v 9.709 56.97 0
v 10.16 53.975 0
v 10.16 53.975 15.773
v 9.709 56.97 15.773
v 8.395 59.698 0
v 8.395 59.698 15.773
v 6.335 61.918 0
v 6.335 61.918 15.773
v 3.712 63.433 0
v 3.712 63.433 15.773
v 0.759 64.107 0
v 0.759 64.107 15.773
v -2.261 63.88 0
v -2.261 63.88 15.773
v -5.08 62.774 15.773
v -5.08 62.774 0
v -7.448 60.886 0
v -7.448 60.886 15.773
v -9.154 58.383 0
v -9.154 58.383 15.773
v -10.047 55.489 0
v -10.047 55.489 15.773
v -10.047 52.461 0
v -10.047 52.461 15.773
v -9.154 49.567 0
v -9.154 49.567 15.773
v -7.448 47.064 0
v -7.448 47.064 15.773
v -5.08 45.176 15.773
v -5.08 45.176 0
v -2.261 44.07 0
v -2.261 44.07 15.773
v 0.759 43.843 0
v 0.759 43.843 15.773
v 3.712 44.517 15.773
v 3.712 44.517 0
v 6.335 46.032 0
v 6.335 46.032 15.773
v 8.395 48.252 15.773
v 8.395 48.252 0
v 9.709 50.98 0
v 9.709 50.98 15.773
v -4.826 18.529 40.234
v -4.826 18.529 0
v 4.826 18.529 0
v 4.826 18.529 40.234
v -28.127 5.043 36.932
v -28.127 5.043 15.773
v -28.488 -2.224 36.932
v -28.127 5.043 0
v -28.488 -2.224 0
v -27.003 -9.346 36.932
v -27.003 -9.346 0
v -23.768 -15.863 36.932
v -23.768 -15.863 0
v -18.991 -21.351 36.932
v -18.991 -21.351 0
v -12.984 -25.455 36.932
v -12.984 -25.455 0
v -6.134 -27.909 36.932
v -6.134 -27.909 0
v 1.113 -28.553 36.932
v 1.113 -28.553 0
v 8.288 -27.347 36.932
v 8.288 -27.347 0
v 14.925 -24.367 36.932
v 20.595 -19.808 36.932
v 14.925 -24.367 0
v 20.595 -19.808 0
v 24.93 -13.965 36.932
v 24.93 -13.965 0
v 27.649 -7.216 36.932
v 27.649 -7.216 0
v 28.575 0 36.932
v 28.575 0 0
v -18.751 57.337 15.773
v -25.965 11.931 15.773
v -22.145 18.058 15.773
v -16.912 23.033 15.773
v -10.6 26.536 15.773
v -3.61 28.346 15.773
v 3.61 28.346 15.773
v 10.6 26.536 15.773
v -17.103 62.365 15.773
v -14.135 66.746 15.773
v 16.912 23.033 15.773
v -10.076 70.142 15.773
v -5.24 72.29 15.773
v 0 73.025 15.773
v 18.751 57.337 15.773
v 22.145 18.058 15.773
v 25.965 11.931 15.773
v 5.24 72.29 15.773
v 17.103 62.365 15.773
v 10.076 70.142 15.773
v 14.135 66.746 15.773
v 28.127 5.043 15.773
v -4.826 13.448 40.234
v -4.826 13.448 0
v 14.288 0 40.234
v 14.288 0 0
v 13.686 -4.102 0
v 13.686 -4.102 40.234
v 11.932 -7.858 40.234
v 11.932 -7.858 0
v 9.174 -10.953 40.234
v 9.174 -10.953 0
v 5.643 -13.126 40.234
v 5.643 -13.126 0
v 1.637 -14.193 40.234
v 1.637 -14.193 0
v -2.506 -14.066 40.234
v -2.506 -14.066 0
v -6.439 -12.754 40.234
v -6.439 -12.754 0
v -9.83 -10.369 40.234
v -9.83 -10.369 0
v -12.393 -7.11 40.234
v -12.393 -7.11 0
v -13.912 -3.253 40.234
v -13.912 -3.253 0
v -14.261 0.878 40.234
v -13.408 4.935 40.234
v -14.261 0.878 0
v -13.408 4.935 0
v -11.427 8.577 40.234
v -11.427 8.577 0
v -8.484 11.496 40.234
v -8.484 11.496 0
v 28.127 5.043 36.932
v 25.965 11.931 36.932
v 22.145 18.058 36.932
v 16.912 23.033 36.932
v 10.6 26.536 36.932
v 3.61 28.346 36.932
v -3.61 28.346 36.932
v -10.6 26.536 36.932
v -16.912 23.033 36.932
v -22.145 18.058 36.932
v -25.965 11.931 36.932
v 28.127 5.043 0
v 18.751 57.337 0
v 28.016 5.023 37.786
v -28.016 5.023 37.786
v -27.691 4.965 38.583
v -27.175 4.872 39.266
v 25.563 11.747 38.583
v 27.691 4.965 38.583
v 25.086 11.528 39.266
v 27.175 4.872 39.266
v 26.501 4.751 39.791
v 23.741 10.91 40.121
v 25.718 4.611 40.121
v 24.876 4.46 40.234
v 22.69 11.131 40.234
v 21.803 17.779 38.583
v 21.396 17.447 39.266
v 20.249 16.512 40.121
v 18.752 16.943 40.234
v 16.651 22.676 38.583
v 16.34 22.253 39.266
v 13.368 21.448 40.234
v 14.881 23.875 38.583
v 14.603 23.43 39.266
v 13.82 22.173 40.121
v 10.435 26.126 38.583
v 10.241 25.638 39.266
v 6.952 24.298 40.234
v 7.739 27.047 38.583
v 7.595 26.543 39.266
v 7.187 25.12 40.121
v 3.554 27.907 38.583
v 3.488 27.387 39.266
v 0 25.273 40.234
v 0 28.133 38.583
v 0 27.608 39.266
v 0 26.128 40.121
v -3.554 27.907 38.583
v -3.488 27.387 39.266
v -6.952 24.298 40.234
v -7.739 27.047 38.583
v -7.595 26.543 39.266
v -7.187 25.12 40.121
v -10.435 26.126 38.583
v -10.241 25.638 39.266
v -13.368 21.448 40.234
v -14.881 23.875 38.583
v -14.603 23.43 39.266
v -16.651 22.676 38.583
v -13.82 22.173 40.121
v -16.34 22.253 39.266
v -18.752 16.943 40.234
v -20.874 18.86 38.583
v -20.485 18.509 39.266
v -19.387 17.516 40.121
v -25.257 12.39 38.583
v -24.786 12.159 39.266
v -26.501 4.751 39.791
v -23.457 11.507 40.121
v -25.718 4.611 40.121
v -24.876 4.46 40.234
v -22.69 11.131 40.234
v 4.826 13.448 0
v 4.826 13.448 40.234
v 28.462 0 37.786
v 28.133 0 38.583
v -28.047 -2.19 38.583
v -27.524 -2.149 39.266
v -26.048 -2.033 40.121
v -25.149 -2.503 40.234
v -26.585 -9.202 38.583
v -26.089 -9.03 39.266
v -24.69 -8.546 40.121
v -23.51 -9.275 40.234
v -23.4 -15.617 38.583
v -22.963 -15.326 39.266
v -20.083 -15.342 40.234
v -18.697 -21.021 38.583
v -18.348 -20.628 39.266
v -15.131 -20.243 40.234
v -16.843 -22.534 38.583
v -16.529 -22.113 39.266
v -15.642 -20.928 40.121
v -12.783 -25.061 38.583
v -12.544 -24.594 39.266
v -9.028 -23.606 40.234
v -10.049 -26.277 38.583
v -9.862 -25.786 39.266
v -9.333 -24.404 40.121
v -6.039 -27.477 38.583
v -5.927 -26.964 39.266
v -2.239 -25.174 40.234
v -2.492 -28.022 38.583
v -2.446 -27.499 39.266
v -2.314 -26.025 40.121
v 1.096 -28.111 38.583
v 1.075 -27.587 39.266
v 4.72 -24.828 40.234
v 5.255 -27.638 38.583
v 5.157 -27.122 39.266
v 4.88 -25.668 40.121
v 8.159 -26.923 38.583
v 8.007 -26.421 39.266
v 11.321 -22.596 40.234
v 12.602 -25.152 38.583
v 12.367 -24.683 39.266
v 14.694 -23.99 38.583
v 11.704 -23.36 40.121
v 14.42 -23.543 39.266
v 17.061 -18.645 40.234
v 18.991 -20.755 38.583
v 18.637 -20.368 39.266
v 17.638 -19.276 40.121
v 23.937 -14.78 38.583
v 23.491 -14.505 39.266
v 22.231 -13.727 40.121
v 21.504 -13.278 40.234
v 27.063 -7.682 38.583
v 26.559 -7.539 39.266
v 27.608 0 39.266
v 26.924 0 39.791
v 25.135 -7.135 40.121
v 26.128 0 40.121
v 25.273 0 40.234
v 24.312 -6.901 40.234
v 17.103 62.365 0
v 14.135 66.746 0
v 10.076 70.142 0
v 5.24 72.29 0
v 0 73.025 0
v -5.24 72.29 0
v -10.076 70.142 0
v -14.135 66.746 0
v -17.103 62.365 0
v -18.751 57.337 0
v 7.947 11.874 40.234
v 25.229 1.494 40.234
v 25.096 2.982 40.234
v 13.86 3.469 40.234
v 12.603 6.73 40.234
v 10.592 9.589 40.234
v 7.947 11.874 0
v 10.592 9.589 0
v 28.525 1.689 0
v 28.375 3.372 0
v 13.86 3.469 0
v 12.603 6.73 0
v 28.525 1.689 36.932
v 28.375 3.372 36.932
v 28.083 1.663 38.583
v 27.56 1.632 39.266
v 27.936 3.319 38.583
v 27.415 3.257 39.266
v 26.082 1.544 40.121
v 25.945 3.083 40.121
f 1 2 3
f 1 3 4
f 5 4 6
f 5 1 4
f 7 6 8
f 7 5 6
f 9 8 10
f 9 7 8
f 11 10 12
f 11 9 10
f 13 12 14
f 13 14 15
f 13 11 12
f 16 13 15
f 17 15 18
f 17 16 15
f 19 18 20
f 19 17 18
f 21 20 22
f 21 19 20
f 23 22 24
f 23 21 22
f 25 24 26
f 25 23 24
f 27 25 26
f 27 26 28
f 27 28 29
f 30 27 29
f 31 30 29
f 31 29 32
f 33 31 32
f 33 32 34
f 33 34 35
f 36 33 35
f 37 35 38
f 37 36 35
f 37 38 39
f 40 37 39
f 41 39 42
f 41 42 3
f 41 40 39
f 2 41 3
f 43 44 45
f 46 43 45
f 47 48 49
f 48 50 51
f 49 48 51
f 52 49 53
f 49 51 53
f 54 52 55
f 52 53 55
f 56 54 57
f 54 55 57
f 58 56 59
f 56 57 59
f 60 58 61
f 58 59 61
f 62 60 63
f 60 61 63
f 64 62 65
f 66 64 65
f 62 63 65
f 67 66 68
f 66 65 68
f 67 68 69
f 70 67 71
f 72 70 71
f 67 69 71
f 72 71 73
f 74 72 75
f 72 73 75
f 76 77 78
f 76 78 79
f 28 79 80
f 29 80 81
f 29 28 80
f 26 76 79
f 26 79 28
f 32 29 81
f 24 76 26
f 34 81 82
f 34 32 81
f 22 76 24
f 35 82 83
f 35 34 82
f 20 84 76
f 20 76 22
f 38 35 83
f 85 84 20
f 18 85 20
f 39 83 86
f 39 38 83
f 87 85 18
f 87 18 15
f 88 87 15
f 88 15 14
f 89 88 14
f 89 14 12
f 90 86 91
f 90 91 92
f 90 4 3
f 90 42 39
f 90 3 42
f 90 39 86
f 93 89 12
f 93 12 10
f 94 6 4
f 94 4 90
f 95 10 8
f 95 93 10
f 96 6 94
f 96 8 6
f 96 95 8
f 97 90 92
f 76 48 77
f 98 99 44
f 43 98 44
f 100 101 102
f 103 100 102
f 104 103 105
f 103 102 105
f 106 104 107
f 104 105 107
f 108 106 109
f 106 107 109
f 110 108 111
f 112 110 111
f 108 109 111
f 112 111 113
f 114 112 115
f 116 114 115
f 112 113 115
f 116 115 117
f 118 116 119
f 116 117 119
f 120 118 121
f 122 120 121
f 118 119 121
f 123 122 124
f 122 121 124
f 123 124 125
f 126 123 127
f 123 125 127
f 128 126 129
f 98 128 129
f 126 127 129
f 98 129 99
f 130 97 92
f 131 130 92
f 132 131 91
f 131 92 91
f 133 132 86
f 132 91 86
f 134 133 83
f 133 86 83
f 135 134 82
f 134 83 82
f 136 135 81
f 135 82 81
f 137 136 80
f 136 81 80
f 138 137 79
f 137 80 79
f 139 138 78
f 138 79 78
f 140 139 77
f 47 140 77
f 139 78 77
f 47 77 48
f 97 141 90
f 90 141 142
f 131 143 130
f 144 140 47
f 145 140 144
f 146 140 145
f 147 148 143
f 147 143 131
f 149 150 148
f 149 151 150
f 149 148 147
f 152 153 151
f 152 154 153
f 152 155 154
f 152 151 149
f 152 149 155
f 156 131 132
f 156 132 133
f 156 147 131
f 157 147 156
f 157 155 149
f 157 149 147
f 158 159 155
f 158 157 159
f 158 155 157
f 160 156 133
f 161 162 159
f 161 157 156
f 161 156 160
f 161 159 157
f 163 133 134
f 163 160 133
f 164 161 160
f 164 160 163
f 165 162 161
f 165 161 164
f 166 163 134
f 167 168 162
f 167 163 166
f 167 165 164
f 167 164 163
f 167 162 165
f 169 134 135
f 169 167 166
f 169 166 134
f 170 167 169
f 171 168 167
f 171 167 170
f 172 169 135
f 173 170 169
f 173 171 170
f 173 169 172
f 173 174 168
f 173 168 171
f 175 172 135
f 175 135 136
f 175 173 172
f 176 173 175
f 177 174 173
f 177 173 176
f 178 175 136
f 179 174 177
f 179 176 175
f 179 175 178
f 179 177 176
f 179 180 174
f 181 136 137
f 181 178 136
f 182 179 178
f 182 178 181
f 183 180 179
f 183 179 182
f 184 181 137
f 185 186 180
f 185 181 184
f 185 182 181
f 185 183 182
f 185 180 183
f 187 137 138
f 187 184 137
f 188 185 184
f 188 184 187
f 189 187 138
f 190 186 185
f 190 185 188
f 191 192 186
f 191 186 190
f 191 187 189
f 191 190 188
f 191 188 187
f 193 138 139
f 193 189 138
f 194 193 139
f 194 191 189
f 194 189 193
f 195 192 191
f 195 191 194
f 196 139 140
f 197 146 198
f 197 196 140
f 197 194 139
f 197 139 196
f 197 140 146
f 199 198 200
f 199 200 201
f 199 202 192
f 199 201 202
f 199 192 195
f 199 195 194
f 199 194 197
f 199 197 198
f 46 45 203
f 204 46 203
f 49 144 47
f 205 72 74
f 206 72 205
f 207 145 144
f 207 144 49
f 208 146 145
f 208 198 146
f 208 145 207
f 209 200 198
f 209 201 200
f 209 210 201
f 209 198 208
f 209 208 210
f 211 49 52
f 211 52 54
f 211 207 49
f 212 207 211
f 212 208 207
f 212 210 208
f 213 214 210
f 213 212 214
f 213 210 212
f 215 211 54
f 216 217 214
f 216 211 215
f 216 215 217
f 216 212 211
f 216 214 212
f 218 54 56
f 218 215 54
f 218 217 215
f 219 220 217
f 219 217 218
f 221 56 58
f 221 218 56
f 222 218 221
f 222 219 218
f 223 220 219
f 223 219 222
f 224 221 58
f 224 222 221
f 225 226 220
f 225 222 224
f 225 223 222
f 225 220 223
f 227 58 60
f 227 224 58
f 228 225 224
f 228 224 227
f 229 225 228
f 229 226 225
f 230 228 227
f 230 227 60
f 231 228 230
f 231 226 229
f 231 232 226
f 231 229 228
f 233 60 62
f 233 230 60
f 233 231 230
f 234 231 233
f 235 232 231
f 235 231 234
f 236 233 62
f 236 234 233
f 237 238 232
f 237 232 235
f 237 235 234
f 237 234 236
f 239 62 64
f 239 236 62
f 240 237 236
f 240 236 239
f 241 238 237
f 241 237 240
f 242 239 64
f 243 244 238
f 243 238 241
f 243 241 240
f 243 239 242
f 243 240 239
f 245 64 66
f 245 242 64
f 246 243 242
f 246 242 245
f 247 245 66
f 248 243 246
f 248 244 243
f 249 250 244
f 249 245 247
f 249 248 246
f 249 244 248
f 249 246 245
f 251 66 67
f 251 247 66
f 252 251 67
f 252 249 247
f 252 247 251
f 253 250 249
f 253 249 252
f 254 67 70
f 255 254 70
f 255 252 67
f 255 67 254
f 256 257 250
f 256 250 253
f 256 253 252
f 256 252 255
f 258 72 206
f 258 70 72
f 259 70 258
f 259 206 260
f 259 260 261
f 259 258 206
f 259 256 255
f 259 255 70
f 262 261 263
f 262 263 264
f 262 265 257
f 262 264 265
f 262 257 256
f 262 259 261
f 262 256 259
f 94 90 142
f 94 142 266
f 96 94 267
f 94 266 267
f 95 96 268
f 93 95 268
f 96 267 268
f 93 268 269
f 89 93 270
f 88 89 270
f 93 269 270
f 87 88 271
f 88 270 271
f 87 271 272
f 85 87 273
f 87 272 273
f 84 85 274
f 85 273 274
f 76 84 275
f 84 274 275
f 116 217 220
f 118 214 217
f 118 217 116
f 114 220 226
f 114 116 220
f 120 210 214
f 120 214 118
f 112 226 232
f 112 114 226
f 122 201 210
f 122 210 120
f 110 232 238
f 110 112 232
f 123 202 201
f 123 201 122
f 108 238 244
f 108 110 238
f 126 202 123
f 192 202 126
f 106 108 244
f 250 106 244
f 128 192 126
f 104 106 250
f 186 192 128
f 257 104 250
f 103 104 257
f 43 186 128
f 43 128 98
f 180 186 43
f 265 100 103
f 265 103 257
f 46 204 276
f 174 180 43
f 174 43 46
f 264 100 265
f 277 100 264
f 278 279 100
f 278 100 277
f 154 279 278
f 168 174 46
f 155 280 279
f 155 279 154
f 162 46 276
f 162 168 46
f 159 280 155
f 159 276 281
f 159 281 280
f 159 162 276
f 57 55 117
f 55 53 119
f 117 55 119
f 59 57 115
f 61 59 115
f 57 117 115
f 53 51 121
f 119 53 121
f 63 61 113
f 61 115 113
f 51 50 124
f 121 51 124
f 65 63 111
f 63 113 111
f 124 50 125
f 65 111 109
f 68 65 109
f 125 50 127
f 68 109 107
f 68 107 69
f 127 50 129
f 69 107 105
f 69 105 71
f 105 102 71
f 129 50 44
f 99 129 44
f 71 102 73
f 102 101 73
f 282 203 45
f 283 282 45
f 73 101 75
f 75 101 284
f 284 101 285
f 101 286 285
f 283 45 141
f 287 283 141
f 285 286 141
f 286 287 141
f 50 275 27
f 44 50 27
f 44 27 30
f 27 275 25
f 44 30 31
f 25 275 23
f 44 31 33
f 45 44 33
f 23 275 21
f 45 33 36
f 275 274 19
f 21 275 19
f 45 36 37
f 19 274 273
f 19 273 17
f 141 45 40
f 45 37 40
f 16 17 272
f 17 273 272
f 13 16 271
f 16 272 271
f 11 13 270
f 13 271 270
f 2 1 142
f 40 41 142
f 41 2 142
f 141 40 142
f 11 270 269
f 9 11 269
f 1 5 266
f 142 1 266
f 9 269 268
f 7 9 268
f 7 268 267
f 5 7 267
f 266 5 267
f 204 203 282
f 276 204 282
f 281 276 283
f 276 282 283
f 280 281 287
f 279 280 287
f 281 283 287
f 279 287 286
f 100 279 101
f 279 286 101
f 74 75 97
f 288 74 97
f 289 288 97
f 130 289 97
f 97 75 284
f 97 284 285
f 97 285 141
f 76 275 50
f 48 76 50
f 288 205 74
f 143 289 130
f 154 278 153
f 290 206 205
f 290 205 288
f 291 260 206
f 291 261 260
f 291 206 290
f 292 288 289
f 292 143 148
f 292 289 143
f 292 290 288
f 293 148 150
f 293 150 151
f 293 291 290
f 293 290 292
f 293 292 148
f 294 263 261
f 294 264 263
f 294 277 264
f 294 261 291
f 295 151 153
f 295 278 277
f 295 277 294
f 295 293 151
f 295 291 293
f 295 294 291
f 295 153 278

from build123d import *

# Parameters (mm, degrees)
F1_DEPTH = 40.2336
F2_R     = 3.302
F0_R     = 10.16
F3_DEPTH = 15.7734


with BuildPart() as f1:
    # F0 (on Top) → F1 (new body)
    with BuildSketch(Plane.XY):
        with BuildLine():
            ThreePointArc((-28.126541, 5.042647), (-2.531275, -28.462665), (28.575, 0))
            ThreePointArc((28.575, 0), (28.462665, 2.531275), (28.126541, 5.042647))
            ThreePointArc((28.126541, 5.042647), (0, 28.575), (-28.126541, 5.042647))
        make_face()
        with BuildLine():
            ThreePointArc((4.826, 13.447765), (11.685122, 8.22135), (14.2875, 0))
            ThreePointArc((14.2875, 0), (-8.22135, -11.685122), (-4.826, 13.447765))
            Line((-4.826, 13.447765), (-4.826, 18.5293))
            Line((-4.826, 18.5293), (0, 18.5293))
            Line((0, 18.5293), (4.826, 18.5293))
            Line((4.826, 18.5293), (4.826, 13.447765))
        make_face(mode=Mode.SUBTRACT)
    extrude(amount=F1_DEPTH)

    # F2
    f2_edges = [f1.edges().sort_by_distance(p)[0] for p in [
        (-28.575, 0, 40.2336),
    ]]
    fillet(f2_edges, radius=F2_R)

    # F0 (on Top) → F3 (join)
    with BuildSketch(Plane.XY):
        with BuildLine():
            ThreePointArc((-28.126541, 5.042647), (0, 28.575), (28.126541, 5.042647))
            Line((28.126541, 5.042647), (18.751028, 57.336765))
            ThreePointArc((18.751028, 57.336765), (18.97511, 55.662516), (19.05, 53.975))
            ThreePointArc((19.05, 53.975), (-1.687516, 34.99989), (-18.751028, 57.336765))
            Line((-18.751028, 57.336765), (-28.126541, 5.042647))
        make_face()
        with BuildLine():
            ThreePointArc((19.05, 53.975), (18.97511, 55.662516), (18.751028, 57.336765))
            ThreePointArc((18.751028, 57.336765), (0, 73.025), (-18.751028, 57.336765))
            ThreePointArc((-18.751028, 57.336765), (-1.687516, 34.99989), (19.05, 53.975))
        make_face()
        with Locations((0, 53.975)):
            Circle(F0_R, mode=Mode.SUBTRACT)
    extrude(amount=F3_DEPTH)


solid = f1.part
